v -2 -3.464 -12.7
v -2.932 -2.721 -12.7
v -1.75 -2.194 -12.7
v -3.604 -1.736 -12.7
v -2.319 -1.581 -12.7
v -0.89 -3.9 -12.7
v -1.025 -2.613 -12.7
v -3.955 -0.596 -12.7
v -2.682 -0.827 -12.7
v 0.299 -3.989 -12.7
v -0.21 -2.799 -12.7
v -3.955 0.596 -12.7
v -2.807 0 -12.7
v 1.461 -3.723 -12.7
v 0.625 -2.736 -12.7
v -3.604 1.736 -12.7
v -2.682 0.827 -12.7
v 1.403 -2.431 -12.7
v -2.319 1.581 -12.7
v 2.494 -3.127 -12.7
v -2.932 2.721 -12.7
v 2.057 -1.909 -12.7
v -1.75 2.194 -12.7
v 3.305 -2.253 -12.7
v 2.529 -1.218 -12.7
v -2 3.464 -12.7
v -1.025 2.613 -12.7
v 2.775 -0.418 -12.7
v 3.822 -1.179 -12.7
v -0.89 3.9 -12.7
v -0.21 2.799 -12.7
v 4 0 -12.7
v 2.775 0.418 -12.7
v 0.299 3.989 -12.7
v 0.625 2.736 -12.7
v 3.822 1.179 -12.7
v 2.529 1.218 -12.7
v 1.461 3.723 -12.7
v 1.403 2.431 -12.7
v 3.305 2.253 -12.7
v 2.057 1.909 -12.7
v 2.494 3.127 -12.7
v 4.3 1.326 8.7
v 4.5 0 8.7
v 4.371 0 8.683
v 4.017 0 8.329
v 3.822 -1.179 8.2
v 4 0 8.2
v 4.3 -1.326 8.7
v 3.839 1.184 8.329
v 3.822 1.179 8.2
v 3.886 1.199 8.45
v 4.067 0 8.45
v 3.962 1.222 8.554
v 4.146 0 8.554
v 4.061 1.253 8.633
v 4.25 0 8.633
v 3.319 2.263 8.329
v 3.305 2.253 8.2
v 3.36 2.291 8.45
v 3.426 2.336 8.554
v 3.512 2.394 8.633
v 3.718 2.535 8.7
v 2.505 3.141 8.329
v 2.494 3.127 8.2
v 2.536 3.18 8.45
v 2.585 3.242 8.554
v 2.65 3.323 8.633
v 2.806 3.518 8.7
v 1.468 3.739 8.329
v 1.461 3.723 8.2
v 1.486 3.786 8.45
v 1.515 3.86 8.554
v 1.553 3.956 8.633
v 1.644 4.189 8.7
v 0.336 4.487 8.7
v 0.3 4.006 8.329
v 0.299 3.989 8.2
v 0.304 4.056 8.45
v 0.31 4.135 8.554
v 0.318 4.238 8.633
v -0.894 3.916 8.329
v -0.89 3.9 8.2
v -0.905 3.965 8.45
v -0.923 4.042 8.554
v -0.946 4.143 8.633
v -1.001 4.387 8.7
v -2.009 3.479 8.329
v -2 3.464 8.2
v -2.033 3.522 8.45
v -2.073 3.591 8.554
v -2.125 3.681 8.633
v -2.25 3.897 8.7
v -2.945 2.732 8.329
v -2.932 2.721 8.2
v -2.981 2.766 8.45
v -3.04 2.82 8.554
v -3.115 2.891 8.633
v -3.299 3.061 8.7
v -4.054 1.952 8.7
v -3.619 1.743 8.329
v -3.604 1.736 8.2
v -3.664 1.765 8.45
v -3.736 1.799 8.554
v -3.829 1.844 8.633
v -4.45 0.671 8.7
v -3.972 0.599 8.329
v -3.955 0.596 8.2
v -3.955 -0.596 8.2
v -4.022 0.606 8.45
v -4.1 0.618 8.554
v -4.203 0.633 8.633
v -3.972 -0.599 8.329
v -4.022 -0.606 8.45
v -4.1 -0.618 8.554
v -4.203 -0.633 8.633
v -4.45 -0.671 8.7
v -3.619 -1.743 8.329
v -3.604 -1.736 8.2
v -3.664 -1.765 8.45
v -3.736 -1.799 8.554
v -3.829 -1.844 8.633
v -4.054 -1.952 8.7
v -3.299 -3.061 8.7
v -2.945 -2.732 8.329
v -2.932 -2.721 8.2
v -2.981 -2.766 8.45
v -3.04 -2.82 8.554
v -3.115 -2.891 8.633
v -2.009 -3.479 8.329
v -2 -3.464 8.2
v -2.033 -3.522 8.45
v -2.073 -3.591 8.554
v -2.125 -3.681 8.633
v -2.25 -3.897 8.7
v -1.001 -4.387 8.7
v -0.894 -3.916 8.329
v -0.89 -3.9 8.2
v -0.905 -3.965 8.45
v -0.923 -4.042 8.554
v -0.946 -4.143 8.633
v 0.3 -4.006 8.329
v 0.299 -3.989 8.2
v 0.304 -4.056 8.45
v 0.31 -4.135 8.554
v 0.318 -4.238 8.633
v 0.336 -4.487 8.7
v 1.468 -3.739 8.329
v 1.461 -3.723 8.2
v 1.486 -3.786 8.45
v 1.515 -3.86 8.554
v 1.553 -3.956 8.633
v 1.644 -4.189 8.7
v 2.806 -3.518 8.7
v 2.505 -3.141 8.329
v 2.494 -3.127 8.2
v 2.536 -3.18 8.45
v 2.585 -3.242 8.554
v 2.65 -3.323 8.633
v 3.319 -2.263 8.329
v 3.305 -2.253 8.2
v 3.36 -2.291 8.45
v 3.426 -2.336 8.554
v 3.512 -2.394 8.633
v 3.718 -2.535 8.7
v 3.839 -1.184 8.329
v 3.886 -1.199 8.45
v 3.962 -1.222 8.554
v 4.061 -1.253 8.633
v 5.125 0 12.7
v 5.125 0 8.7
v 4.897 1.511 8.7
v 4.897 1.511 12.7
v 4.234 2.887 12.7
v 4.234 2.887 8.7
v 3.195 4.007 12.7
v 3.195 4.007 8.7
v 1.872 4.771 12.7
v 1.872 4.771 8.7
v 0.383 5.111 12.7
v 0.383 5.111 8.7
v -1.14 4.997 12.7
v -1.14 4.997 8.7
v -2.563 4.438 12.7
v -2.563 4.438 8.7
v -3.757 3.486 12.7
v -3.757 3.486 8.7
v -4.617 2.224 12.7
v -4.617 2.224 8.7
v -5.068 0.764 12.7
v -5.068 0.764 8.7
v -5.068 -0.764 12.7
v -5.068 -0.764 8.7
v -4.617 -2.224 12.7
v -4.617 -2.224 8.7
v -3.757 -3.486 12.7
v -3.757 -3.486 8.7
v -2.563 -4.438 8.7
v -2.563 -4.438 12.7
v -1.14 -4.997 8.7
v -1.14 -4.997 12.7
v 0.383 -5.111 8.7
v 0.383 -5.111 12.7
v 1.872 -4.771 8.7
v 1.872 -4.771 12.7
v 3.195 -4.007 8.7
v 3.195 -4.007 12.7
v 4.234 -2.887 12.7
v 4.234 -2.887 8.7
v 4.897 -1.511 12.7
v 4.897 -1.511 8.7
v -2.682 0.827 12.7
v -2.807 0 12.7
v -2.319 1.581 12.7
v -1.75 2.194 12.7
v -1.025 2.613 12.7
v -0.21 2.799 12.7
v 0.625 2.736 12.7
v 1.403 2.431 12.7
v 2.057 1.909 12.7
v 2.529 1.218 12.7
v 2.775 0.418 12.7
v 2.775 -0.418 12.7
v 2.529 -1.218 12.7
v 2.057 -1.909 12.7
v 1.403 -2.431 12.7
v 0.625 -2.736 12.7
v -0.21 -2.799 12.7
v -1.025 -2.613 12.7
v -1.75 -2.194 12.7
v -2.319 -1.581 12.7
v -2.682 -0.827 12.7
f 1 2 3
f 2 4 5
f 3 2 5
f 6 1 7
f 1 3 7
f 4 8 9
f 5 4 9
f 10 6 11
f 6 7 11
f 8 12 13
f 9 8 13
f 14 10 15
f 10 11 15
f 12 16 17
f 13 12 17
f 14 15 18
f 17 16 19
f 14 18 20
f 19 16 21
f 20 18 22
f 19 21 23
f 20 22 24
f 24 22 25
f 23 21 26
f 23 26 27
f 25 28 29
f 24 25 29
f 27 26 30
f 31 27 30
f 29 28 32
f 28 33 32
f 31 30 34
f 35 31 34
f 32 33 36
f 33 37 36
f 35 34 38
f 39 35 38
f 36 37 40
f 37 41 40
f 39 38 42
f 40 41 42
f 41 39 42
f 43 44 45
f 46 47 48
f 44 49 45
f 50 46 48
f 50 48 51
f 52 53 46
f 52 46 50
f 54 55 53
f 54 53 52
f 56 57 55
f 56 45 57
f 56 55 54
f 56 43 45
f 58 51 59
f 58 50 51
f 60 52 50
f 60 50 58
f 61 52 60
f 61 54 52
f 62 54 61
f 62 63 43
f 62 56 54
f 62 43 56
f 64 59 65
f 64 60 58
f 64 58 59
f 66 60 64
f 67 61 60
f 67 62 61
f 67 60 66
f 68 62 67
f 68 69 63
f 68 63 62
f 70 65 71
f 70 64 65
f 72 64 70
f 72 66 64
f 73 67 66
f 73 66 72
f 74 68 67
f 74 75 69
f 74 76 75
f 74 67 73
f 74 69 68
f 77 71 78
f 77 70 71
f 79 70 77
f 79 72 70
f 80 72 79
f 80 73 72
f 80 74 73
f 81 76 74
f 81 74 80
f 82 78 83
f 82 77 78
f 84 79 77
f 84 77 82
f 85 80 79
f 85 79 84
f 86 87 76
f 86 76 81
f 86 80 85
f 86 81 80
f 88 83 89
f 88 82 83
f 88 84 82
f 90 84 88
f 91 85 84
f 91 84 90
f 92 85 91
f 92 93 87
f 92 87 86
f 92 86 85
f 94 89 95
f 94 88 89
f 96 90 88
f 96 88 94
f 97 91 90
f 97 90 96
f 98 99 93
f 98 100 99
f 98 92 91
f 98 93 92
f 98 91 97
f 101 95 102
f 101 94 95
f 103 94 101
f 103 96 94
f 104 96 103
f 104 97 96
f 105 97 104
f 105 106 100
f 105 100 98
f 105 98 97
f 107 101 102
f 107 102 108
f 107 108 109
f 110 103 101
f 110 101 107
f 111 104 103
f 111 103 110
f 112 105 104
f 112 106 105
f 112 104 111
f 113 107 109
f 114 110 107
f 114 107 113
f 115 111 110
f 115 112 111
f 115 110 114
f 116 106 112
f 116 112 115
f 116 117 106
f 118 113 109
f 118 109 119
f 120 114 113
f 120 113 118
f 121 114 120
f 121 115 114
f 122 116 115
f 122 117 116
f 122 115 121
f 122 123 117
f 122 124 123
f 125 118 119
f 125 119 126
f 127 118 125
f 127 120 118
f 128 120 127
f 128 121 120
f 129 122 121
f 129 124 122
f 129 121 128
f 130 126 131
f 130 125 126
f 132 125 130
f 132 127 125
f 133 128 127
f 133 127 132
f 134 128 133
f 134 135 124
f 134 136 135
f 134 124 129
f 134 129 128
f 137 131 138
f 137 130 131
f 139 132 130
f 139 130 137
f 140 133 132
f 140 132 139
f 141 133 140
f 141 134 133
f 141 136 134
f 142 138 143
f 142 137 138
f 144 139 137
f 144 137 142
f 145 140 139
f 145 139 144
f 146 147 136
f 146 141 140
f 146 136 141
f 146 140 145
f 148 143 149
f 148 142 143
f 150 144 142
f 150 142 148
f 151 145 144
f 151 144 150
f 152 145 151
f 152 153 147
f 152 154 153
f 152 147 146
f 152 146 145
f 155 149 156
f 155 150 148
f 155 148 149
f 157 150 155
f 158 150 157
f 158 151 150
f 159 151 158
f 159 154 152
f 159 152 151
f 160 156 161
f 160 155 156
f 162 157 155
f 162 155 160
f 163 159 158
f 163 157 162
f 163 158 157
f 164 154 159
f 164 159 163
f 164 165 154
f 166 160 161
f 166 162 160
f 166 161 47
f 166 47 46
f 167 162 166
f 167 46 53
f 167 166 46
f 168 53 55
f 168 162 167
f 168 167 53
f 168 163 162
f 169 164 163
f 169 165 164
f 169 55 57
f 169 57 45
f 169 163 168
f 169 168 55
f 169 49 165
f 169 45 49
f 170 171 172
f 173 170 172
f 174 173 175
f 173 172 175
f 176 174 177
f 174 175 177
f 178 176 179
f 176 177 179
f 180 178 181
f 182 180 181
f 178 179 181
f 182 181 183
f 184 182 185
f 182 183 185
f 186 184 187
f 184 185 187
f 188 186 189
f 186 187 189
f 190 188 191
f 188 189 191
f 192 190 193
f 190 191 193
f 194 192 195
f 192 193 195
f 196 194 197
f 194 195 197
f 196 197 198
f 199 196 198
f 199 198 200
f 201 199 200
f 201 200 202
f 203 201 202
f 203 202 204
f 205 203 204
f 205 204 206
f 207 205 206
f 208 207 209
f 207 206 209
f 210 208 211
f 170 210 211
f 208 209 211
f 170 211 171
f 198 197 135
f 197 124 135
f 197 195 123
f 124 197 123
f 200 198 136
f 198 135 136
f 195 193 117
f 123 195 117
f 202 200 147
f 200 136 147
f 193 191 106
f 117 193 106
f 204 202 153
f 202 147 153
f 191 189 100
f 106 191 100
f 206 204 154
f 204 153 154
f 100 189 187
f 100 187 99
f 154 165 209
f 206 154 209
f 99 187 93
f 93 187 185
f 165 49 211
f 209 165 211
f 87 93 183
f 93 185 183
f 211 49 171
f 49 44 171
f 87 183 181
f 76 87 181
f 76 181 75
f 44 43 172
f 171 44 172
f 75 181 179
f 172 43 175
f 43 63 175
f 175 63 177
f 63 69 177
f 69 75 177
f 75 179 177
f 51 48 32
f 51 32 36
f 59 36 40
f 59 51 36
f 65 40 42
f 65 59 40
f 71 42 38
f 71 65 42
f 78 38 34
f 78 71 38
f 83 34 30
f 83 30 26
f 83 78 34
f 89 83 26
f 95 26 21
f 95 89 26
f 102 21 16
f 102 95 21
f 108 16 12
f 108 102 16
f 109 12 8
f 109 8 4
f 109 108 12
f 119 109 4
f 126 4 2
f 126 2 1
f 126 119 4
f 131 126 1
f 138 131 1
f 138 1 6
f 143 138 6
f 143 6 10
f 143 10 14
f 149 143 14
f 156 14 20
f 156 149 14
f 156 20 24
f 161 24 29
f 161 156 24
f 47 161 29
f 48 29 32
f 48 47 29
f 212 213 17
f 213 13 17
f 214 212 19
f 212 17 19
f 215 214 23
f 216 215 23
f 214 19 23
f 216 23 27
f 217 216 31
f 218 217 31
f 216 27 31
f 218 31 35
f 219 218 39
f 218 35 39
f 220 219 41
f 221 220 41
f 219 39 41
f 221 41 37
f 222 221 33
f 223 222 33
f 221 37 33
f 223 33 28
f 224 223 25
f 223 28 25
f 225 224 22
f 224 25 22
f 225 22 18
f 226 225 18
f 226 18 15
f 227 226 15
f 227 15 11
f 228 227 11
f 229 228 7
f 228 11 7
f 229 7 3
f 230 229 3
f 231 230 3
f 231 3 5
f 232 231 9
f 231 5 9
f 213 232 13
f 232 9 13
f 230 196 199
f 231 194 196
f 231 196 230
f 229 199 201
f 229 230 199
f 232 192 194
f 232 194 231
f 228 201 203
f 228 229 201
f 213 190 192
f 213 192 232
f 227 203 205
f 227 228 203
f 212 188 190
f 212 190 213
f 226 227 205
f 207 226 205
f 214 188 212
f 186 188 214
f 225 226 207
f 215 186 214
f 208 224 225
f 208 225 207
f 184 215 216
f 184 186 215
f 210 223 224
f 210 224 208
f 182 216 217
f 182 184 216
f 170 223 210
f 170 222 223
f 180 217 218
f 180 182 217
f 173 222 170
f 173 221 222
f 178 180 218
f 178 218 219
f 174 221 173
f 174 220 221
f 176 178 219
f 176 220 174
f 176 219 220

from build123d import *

# Parameters (mm, degrees)
SKETCH1_R              = 4
BOSS_EXTRUDE1_DEPTH    = 12.7
F_10_CLEARANCE_HOLE1_D = 5.6134
BOSS_EXTRUDE2_START    = -4
SKETCH4_R              = 5.125
SKETCH4_R_2            = 2.8067
BOSS_EXTRUDE2_DEPTH    = 4
FILLET1_R              = 0.5


with BuildPart() as part:
    # Sketch1 → Boss-Extrude1 (new, symmetric)
    with BuildSketch(Plane.XY):
        Circle(SKETCH1_R)
    extrude(amount=BOSS_EXTRUDE1_DEPTH, both=True)

    # #10 Clearance Hole1 (through all)
    with Locations(Plane.XY.offset(12.7)):
        with Locations((0, 0)):
            Hole(F_10_CLEARANCE_HOLE1_D / 2)

    # Sketch4 → Boss-Extrude2 (add)
    with BuildSketch(Plane.XY.offset(12.7).offset(BOSS_EXTRUDE2_START)):
        Circle(SKETCH4_R)
        Circle(SKETCH4_R_2, mode=Mode.SUBTRACT)
    extrude(amount=BOSS_EXTRUDE2_DEPTH)

    # Fillet1
    fillet1_edges = [part.edges().sort_by_distance(p)[0] for p in [
        (-4, 0, 8.7),
    ]]
    fillet(fillet1_edges, radius=FILLET1_R)


solid = part.part
